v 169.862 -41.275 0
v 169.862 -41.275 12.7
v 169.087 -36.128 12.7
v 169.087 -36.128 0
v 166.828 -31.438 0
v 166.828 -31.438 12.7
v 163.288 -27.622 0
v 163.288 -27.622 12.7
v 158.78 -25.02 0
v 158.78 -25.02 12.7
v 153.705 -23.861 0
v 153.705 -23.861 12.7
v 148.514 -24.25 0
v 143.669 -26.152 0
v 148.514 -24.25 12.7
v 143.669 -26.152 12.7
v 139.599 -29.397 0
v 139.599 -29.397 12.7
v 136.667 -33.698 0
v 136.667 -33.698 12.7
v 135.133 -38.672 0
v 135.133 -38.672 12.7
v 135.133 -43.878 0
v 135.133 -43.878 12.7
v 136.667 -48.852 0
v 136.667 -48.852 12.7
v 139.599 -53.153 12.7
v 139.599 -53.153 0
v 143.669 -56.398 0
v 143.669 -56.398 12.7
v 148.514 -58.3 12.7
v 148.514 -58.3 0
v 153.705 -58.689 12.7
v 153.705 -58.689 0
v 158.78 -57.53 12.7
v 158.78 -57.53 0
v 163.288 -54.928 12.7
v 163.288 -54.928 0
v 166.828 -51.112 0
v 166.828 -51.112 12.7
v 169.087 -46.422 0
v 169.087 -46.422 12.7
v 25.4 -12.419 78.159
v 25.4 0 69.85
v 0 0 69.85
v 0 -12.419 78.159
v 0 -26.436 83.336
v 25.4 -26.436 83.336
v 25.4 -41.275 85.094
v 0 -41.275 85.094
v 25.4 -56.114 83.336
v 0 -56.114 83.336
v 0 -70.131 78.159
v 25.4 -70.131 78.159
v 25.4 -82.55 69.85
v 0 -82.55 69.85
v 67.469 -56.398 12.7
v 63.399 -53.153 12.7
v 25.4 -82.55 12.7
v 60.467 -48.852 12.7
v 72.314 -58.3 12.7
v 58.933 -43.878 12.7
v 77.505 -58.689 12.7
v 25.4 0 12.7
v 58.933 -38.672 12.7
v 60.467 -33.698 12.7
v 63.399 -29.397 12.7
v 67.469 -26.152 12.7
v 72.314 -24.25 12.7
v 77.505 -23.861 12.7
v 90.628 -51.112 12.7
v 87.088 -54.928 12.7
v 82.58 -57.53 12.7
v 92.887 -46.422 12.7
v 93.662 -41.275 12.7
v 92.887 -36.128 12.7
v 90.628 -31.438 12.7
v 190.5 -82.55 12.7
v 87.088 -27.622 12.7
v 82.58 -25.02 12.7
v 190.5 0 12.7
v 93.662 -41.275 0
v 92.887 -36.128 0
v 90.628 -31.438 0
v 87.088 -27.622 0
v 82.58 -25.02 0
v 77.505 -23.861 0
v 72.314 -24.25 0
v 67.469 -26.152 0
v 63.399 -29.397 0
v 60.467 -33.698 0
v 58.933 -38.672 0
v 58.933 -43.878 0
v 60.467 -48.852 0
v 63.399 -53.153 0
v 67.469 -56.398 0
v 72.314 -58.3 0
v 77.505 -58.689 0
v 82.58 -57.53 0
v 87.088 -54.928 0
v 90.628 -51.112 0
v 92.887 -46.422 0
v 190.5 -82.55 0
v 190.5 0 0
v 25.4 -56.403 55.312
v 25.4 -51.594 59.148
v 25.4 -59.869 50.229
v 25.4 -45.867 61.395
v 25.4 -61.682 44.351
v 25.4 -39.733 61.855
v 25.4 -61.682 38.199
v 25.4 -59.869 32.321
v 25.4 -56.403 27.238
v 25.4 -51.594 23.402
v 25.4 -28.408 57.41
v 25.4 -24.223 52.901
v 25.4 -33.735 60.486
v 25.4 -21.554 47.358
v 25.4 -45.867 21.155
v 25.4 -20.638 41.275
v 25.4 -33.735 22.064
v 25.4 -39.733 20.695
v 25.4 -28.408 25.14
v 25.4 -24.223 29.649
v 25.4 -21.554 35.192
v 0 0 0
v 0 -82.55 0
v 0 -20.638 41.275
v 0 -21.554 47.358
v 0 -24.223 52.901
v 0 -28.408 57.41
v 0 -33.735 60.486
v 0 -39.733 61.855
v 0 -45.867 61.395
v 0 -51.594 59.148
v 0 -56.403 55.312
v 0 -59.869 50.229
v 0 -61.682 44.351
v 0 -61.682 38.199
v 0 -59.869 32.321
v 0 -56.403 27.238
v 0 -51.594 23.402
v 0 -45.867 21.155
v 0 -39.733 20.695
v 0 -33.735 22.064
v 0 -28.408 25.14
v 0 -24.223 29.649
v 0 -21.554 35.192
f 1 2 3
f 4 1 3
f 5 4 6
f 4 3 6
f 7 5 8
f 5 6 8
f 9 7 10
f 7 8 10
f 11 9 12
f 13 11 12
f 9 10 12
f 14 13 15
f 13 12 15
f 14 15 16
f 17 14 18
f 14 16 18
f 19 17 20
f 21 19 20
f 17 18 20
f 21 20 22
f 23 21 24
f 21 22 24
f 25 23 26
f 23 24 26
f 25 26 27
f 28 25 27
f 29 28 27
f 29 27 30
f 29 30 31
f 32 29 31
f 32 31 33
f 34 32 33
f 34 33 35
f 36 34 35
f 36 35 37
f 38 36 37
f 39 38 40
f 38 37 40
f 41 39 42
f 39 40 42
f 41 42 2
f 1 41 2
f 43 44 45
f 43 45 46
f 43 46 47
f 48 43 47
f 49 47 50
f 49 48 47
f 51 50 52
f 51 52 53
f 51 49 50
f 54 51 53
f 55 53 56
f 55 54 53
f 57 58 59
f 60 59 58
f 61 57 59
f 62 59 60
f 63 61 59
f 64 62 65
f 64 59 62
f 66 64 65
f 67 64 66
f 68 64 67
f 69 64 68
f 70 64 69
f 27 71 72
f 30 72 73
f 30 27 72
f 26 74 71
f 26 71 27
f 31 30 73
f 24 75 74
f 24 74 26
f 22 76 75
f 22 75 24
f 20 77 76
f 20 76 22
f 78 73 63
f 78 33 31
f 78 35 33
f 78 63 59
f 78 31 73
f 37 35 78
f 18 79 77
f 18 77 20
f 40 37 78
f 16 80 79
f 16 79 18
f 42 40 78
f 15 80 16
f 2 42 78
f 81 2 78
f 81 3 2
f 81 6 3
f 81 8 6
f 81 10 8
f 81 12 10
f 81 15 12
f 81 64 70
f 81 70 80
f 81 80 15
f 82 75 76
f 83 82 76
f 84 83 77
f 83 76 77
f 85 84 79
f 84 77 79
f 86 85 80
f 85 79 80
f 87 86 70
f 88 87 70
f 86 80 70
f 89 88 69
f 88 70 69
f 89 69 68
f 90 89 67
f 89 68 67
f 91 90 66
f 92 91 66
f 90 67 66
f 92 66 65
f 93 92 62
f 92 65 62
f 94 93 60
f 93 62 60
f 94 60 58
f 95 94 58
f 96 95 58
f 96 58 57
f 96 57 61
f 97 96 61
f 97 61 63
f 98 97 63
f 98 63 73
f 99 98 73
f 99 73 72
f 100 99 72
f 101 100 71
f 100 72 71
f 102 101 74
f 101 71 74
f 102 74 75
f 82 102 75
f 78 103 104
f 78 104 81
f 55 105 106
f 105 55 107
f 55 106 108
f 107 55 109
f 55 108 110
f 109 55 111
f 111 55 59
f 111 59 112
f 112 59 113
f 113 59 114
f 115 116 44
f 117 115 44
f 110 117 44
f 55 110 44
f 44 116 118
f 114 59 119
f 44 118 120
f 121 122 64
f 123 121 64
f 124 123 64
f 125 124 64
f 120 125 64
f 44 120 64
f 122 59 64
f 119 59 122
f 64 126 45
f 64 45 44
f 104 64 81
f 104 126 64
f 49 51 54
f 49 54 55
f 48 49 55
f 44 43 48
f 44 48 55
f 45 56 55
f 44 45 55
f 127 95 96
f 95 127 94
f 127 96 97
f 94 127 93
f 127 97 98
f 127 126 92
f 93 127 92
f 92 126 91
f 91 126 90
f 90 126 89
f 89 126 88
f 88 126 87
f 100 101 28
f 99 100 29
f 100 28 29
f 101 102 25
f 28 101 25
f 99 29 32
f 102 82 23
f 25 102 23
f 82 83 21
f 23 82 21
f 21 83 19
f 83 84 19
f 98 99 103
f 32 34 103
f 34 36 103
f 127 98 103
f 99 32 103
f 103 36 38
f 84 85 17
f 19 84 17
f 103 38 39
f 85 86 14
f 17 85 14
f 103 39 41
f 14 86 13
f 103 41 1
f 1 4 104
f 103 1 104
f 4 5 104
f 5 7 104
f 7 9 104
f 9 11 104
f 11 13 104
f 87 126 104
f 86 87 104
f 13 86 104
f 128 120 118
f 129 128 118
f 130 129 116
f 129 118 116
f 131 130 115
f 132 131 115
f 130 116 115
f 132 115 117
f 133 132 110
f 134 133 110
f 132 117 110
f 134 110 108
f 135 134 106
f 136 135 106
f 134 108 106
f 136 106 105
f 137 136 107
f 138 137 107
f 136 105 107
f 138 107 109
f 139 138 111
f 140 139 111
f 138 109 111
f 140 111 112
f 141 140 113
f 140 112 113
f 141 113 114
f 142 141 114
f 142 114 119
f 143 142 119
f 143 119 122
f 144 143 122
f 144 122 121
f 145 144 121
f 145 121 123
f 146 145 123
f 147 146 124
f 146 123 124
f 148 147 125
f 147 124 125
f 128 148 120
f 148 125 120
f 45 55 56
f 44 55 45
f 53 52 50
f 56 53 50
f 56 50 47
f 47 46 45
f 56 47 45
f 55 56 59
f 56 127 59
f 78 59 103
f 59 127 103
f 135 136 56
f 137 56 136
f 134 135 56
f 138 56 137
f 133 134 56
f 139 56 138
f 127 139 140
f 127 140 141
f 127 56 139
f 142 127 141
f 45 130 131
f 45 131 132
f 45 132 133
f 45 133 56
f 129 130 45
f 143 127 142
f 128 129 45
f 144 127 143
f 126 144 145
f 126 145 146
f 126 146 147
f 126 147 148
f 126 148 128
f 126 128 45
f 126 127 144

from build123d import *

# Parameters (mm, degrees)
F0_W     = 190.5
F0_H     = 12.7
F1_DEPTH = 82.55
F2_W     = 25.4
F2_H     = 82.55
F3_DEPTH = 57.15
F5_DEPTH = 25.4
F6_R     = 20.6375
F7_DEPTH = 25.4
F8_R     = 17.4625
F9_DEPTH = 12.7


with BuildPart() as f1:
    # F0 (on Front) → F1 (new body)
    with BuildSketch(Plane.XZ):
        with Locations((95.25, 6.35)):
            Rectangle(F0_W, F0_H)
    extrude(amount=F1_DEPTH)

    # F2 (on face) → F3 (join)
    with BuildSketch(Plane.XY.offset(12.7)):
        with Locations((12.7, -41.275)):
            Rectangle(F2_W, F2_H)
    extrude(amount=F3_DEPTH)

    # F6 (on face) → F7 (cut, through all)
    with BuildSketch(Plane.YZ.offset(25.4)):
        with Locations((-41.275, 41.275)):
            Circle(F6_R)
    extrude(amount=-F7_DEPTH, mode=Mode.SUBTRACT)

    # F8 (on face) → F9 (cut, through all)
    with BuildSketch(Plane.XY.offset(12.7)):
        with Locations((76.2, -41.275)):
            Circle(F8_R)
        with Locations((152.4, -41.275)):
            Circle(F8_R)
    extrude(amount=-F9_DEPTH, mode=Mode.SUBTRACT)


with BuildPart() as f5:
    # F4 (on face) → F5 (new body)
    with BuildSketch(Plane.YZ.offset(25.4)):
        with BuildLine():
            Line((-82.55, 69.85), (0, 69.85))
            ThreePointArc((0, 69.85), (-41.275, 85.094178), (-82.55, 69.85))
        make_face()
    extrude(amount=-F5_DEPTH)


solid = Compound([f1.part, f5.part])
